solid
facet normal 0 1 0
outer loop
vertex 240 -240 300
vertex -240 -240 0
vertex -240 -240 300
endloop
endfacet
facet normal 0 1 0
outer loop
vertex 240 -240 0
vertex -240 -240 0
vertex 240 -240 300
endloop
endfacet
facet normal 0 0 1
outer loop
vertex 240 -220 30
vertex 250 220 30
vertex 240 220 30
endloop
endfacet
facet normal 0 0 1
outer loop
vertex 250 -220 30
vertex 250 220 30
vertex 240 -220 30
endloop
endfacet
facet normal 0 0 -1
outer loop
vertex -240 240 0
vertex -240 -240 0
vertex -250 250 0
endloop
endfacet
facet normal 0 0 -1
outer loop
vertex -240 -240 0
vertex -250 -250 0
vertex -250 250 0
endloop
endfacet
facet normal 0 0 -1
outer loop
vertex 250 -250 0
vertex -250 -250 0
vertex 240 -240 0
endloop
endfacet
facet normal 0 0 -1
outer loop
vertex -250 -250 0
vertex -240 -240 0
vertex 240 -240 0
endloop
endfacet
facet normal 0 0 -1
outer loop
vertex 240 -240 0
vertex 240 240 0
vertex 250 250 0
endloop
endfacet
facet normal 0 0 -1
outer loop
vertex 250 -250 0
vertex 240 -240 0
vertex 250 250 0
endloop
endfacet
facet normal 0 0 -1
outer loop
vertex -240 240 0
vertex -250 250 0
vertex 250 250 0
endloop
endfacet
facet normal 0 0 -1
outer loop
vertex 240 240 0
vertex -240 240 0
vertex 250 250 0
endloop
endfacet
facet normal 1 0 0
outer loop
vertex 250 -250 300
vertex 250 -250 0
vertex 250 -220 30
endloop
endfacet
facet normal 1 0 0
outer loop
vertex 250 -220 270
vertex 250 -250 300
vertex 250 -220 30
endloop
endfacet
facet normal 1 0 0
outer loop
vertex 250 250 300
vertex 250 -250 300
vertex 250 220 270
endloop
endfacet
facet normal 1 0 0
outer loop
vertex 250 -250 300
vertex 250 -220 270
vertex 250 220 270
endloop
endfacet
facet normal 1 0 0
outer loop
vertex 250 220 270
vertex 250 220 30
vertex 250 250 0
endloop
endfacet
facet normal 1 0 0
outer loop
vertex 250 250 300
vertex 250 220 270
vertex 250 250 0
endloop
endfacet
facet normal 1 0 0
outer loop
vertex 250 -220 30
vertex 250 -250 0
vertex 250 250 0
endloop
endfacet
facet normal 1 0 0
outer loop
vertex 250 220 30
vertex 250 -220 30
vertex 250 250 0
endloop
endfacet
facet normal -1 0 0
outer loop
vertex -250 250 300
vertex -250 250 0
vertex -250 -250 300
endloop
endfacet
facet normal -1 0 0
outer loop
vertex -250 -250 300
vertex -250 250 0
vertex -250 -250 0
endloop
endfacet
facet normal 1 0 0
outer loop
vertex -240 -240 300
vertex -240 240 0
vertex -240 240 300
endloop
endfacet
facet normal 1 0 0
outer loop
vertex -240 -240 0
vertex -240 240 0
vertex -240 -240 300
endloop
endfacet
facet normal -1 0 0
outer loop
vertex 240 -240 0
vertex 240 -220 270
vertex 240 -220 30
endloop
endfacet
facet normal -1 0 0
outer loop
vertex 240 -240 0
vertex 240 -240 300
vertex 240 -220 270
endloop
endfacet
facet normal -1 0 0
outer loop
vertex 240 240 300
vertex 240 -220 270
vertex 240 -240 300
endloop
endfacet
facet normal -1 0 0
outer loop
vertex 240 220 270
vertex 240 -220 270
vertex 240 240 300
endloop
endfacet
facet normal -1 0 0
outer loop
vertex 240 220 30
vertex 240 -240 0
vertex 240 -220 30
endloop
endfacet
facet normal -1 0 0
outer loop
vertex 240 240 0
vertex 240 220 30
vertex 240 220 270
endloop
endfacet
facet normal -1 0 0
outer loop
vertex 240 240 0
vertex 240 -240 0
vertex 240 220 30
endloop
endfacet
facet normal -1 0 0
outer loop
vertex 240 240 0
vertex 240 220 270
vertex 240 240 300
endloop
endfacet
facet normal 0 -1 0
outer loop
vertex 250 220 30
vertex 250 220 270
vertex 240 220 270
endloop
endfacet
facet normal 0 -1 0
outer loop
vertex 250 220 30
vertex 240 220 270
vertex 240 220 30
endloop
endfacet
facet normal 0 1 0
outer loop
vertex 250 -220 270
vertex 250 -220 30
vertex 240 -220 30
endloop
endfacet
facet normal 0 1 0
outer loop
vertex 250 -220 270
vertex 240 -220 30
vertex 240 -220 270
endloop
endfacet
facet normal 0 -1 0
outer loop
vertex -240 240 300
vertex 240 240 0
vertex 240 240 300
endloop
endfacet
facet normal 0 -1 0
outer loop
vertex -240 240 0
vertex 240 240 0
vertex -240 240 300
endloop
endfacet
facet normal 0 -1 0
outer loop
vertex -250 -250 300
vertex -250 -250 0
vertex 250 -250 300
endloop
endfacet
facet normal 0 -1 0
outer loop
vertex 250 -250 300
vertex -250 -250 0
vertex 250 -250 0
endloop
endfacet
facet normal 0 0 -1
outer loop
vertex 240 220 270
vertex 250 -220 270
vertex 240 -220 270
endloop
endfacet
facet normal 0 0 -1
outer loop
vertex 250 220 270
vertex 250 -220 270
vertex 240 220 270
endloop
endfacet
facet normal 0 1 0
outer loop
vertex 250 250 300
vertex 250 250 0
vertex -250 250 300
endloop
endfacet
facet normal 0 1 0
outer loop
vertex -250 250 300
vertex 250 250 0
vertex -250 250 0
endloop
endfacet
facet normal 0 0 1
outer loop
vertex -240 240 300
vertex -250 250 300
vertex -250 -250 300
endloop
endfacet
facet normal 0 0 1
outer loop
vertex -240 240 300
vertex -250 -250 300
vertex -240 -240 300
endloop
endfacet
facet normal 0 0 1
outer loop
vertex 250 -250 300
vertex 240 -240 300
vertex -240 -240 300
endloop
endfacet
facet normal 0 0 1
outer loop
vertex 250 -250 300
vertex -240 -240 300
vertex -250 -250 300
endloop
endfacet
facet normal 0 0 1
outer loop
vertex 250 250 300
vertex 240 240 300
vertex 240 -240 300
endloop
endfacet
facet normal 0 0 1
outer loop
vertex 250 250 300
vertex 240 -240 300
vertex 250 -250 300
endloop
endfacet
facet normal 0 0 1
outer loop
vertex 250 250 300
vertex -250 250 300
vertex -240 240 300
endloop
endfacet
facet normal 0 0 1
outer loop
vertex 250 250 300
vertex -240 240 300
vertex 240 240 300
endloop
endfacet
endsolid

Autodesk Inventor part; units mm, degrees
ref_plane "YZ Plane" through (0, 0, 0) normal (1, 0, 0) x (0, 1, 0)
ref_plane "XZ Plane" through (0, 0, 0) normal (0, 1, 0) x (-1, 0, 0)
ref_plane "XY Plane" through (0, 0, 0) normal (0, 0, 1) x (1, 0, 0)
sketch "Sketch1" plane through (0, 0, 0) normal (0, 0, 1) x (1, 0, 0)
  line L0 (-250, -250) -> (250, -250)
  line L1 (250, -250) -> (250, 250)
  line L2 (250, 250) -> (-250, 250)
  line L3 (-250, 250) -> (-250, -250)
  line L4 (-250, -250) -> (250, 250) construction
  line L5 (250, -250) -> (-250, 250) construction
  point P0 (0, 0)
  dimension "d0" = 500
  dimension "d1" = 500
extrude "Extrusion1" add sketch "Sketch1" along normal blind 300
shell "Shell1" thickness 10 removed faces 2 at (83.3333, -83.3333, 0) at (83.3333, -83.3333, 300)
sketch "Sketch2" plane through (0, 0, 0) normal (1, 0, 0) x (0, 1, 0)
  line L0 (-250, 0) -> (250, 0) construction
  line L1 (250, 0) -> (250, 300) construction
  line L2 (-250, 300) -> (250, 300) construction
  line L3 (-250, 0) -> (-250, 300) construction
  line L4 (-250, 0) -> (-250, 300) construction
  line L5 (-250, 150) -> (250, 150) construction
  circle A0 centre (0, 150) radius 30
  arc A1 (205, 115) -> (17.4379, 125.5885) centre (104.6273, 3.5311) ccw
  arc A2 (160.6867, 200) -> (-12.382, 177.3256) centre (111.438, -95.93) ccw
  arc A3 (205, 115) -> (160.6867, 200) centre (150.8369, 140.814) ccw
  point P0 (0, 0)
  dimension "d5" = 60
  dimension "d6" = 300
  dimension "d7" = 150
  dimension "d8" = 60
  dimension "d9" = 35
  dimension "d10" = 205
  dimension "d11" = 50
extrude "Extrusion2" [suppressed]
pattern_linear "Rectangular Pattern1" [suppressed]
pattern_circular "Circular Pattern1" [suppressed]
sketch "Sketch3" plane through (250, -250, 0) normal (1, 0, 0) x (0, 0, -1)
  line L0 (0, 0) -> (0, 500) projected
  line L1 (0, 500) -> (-300, 500) projected
  line L2 (-300, 0) -> (-300, 500) projected
  line L3 (0, 0) -> (-300, 0) projected
  line L4 (-270, 470) -> (-30, 470)
  line L5 (-30, 470) -> (-30, 30)
  line L6 (-30, 30) -> (-270, 30)
  line L7 (-270, 30) -> (-270, 470)
  point P0 (0, 250)
  dimension "d20" = 30
extrude "Extrusion3" cut sketch "Sketch3" against normal up to surface (10 mm away) contours L4 L5 L6 L7
properties part number "NDM-VOS dummy6"
